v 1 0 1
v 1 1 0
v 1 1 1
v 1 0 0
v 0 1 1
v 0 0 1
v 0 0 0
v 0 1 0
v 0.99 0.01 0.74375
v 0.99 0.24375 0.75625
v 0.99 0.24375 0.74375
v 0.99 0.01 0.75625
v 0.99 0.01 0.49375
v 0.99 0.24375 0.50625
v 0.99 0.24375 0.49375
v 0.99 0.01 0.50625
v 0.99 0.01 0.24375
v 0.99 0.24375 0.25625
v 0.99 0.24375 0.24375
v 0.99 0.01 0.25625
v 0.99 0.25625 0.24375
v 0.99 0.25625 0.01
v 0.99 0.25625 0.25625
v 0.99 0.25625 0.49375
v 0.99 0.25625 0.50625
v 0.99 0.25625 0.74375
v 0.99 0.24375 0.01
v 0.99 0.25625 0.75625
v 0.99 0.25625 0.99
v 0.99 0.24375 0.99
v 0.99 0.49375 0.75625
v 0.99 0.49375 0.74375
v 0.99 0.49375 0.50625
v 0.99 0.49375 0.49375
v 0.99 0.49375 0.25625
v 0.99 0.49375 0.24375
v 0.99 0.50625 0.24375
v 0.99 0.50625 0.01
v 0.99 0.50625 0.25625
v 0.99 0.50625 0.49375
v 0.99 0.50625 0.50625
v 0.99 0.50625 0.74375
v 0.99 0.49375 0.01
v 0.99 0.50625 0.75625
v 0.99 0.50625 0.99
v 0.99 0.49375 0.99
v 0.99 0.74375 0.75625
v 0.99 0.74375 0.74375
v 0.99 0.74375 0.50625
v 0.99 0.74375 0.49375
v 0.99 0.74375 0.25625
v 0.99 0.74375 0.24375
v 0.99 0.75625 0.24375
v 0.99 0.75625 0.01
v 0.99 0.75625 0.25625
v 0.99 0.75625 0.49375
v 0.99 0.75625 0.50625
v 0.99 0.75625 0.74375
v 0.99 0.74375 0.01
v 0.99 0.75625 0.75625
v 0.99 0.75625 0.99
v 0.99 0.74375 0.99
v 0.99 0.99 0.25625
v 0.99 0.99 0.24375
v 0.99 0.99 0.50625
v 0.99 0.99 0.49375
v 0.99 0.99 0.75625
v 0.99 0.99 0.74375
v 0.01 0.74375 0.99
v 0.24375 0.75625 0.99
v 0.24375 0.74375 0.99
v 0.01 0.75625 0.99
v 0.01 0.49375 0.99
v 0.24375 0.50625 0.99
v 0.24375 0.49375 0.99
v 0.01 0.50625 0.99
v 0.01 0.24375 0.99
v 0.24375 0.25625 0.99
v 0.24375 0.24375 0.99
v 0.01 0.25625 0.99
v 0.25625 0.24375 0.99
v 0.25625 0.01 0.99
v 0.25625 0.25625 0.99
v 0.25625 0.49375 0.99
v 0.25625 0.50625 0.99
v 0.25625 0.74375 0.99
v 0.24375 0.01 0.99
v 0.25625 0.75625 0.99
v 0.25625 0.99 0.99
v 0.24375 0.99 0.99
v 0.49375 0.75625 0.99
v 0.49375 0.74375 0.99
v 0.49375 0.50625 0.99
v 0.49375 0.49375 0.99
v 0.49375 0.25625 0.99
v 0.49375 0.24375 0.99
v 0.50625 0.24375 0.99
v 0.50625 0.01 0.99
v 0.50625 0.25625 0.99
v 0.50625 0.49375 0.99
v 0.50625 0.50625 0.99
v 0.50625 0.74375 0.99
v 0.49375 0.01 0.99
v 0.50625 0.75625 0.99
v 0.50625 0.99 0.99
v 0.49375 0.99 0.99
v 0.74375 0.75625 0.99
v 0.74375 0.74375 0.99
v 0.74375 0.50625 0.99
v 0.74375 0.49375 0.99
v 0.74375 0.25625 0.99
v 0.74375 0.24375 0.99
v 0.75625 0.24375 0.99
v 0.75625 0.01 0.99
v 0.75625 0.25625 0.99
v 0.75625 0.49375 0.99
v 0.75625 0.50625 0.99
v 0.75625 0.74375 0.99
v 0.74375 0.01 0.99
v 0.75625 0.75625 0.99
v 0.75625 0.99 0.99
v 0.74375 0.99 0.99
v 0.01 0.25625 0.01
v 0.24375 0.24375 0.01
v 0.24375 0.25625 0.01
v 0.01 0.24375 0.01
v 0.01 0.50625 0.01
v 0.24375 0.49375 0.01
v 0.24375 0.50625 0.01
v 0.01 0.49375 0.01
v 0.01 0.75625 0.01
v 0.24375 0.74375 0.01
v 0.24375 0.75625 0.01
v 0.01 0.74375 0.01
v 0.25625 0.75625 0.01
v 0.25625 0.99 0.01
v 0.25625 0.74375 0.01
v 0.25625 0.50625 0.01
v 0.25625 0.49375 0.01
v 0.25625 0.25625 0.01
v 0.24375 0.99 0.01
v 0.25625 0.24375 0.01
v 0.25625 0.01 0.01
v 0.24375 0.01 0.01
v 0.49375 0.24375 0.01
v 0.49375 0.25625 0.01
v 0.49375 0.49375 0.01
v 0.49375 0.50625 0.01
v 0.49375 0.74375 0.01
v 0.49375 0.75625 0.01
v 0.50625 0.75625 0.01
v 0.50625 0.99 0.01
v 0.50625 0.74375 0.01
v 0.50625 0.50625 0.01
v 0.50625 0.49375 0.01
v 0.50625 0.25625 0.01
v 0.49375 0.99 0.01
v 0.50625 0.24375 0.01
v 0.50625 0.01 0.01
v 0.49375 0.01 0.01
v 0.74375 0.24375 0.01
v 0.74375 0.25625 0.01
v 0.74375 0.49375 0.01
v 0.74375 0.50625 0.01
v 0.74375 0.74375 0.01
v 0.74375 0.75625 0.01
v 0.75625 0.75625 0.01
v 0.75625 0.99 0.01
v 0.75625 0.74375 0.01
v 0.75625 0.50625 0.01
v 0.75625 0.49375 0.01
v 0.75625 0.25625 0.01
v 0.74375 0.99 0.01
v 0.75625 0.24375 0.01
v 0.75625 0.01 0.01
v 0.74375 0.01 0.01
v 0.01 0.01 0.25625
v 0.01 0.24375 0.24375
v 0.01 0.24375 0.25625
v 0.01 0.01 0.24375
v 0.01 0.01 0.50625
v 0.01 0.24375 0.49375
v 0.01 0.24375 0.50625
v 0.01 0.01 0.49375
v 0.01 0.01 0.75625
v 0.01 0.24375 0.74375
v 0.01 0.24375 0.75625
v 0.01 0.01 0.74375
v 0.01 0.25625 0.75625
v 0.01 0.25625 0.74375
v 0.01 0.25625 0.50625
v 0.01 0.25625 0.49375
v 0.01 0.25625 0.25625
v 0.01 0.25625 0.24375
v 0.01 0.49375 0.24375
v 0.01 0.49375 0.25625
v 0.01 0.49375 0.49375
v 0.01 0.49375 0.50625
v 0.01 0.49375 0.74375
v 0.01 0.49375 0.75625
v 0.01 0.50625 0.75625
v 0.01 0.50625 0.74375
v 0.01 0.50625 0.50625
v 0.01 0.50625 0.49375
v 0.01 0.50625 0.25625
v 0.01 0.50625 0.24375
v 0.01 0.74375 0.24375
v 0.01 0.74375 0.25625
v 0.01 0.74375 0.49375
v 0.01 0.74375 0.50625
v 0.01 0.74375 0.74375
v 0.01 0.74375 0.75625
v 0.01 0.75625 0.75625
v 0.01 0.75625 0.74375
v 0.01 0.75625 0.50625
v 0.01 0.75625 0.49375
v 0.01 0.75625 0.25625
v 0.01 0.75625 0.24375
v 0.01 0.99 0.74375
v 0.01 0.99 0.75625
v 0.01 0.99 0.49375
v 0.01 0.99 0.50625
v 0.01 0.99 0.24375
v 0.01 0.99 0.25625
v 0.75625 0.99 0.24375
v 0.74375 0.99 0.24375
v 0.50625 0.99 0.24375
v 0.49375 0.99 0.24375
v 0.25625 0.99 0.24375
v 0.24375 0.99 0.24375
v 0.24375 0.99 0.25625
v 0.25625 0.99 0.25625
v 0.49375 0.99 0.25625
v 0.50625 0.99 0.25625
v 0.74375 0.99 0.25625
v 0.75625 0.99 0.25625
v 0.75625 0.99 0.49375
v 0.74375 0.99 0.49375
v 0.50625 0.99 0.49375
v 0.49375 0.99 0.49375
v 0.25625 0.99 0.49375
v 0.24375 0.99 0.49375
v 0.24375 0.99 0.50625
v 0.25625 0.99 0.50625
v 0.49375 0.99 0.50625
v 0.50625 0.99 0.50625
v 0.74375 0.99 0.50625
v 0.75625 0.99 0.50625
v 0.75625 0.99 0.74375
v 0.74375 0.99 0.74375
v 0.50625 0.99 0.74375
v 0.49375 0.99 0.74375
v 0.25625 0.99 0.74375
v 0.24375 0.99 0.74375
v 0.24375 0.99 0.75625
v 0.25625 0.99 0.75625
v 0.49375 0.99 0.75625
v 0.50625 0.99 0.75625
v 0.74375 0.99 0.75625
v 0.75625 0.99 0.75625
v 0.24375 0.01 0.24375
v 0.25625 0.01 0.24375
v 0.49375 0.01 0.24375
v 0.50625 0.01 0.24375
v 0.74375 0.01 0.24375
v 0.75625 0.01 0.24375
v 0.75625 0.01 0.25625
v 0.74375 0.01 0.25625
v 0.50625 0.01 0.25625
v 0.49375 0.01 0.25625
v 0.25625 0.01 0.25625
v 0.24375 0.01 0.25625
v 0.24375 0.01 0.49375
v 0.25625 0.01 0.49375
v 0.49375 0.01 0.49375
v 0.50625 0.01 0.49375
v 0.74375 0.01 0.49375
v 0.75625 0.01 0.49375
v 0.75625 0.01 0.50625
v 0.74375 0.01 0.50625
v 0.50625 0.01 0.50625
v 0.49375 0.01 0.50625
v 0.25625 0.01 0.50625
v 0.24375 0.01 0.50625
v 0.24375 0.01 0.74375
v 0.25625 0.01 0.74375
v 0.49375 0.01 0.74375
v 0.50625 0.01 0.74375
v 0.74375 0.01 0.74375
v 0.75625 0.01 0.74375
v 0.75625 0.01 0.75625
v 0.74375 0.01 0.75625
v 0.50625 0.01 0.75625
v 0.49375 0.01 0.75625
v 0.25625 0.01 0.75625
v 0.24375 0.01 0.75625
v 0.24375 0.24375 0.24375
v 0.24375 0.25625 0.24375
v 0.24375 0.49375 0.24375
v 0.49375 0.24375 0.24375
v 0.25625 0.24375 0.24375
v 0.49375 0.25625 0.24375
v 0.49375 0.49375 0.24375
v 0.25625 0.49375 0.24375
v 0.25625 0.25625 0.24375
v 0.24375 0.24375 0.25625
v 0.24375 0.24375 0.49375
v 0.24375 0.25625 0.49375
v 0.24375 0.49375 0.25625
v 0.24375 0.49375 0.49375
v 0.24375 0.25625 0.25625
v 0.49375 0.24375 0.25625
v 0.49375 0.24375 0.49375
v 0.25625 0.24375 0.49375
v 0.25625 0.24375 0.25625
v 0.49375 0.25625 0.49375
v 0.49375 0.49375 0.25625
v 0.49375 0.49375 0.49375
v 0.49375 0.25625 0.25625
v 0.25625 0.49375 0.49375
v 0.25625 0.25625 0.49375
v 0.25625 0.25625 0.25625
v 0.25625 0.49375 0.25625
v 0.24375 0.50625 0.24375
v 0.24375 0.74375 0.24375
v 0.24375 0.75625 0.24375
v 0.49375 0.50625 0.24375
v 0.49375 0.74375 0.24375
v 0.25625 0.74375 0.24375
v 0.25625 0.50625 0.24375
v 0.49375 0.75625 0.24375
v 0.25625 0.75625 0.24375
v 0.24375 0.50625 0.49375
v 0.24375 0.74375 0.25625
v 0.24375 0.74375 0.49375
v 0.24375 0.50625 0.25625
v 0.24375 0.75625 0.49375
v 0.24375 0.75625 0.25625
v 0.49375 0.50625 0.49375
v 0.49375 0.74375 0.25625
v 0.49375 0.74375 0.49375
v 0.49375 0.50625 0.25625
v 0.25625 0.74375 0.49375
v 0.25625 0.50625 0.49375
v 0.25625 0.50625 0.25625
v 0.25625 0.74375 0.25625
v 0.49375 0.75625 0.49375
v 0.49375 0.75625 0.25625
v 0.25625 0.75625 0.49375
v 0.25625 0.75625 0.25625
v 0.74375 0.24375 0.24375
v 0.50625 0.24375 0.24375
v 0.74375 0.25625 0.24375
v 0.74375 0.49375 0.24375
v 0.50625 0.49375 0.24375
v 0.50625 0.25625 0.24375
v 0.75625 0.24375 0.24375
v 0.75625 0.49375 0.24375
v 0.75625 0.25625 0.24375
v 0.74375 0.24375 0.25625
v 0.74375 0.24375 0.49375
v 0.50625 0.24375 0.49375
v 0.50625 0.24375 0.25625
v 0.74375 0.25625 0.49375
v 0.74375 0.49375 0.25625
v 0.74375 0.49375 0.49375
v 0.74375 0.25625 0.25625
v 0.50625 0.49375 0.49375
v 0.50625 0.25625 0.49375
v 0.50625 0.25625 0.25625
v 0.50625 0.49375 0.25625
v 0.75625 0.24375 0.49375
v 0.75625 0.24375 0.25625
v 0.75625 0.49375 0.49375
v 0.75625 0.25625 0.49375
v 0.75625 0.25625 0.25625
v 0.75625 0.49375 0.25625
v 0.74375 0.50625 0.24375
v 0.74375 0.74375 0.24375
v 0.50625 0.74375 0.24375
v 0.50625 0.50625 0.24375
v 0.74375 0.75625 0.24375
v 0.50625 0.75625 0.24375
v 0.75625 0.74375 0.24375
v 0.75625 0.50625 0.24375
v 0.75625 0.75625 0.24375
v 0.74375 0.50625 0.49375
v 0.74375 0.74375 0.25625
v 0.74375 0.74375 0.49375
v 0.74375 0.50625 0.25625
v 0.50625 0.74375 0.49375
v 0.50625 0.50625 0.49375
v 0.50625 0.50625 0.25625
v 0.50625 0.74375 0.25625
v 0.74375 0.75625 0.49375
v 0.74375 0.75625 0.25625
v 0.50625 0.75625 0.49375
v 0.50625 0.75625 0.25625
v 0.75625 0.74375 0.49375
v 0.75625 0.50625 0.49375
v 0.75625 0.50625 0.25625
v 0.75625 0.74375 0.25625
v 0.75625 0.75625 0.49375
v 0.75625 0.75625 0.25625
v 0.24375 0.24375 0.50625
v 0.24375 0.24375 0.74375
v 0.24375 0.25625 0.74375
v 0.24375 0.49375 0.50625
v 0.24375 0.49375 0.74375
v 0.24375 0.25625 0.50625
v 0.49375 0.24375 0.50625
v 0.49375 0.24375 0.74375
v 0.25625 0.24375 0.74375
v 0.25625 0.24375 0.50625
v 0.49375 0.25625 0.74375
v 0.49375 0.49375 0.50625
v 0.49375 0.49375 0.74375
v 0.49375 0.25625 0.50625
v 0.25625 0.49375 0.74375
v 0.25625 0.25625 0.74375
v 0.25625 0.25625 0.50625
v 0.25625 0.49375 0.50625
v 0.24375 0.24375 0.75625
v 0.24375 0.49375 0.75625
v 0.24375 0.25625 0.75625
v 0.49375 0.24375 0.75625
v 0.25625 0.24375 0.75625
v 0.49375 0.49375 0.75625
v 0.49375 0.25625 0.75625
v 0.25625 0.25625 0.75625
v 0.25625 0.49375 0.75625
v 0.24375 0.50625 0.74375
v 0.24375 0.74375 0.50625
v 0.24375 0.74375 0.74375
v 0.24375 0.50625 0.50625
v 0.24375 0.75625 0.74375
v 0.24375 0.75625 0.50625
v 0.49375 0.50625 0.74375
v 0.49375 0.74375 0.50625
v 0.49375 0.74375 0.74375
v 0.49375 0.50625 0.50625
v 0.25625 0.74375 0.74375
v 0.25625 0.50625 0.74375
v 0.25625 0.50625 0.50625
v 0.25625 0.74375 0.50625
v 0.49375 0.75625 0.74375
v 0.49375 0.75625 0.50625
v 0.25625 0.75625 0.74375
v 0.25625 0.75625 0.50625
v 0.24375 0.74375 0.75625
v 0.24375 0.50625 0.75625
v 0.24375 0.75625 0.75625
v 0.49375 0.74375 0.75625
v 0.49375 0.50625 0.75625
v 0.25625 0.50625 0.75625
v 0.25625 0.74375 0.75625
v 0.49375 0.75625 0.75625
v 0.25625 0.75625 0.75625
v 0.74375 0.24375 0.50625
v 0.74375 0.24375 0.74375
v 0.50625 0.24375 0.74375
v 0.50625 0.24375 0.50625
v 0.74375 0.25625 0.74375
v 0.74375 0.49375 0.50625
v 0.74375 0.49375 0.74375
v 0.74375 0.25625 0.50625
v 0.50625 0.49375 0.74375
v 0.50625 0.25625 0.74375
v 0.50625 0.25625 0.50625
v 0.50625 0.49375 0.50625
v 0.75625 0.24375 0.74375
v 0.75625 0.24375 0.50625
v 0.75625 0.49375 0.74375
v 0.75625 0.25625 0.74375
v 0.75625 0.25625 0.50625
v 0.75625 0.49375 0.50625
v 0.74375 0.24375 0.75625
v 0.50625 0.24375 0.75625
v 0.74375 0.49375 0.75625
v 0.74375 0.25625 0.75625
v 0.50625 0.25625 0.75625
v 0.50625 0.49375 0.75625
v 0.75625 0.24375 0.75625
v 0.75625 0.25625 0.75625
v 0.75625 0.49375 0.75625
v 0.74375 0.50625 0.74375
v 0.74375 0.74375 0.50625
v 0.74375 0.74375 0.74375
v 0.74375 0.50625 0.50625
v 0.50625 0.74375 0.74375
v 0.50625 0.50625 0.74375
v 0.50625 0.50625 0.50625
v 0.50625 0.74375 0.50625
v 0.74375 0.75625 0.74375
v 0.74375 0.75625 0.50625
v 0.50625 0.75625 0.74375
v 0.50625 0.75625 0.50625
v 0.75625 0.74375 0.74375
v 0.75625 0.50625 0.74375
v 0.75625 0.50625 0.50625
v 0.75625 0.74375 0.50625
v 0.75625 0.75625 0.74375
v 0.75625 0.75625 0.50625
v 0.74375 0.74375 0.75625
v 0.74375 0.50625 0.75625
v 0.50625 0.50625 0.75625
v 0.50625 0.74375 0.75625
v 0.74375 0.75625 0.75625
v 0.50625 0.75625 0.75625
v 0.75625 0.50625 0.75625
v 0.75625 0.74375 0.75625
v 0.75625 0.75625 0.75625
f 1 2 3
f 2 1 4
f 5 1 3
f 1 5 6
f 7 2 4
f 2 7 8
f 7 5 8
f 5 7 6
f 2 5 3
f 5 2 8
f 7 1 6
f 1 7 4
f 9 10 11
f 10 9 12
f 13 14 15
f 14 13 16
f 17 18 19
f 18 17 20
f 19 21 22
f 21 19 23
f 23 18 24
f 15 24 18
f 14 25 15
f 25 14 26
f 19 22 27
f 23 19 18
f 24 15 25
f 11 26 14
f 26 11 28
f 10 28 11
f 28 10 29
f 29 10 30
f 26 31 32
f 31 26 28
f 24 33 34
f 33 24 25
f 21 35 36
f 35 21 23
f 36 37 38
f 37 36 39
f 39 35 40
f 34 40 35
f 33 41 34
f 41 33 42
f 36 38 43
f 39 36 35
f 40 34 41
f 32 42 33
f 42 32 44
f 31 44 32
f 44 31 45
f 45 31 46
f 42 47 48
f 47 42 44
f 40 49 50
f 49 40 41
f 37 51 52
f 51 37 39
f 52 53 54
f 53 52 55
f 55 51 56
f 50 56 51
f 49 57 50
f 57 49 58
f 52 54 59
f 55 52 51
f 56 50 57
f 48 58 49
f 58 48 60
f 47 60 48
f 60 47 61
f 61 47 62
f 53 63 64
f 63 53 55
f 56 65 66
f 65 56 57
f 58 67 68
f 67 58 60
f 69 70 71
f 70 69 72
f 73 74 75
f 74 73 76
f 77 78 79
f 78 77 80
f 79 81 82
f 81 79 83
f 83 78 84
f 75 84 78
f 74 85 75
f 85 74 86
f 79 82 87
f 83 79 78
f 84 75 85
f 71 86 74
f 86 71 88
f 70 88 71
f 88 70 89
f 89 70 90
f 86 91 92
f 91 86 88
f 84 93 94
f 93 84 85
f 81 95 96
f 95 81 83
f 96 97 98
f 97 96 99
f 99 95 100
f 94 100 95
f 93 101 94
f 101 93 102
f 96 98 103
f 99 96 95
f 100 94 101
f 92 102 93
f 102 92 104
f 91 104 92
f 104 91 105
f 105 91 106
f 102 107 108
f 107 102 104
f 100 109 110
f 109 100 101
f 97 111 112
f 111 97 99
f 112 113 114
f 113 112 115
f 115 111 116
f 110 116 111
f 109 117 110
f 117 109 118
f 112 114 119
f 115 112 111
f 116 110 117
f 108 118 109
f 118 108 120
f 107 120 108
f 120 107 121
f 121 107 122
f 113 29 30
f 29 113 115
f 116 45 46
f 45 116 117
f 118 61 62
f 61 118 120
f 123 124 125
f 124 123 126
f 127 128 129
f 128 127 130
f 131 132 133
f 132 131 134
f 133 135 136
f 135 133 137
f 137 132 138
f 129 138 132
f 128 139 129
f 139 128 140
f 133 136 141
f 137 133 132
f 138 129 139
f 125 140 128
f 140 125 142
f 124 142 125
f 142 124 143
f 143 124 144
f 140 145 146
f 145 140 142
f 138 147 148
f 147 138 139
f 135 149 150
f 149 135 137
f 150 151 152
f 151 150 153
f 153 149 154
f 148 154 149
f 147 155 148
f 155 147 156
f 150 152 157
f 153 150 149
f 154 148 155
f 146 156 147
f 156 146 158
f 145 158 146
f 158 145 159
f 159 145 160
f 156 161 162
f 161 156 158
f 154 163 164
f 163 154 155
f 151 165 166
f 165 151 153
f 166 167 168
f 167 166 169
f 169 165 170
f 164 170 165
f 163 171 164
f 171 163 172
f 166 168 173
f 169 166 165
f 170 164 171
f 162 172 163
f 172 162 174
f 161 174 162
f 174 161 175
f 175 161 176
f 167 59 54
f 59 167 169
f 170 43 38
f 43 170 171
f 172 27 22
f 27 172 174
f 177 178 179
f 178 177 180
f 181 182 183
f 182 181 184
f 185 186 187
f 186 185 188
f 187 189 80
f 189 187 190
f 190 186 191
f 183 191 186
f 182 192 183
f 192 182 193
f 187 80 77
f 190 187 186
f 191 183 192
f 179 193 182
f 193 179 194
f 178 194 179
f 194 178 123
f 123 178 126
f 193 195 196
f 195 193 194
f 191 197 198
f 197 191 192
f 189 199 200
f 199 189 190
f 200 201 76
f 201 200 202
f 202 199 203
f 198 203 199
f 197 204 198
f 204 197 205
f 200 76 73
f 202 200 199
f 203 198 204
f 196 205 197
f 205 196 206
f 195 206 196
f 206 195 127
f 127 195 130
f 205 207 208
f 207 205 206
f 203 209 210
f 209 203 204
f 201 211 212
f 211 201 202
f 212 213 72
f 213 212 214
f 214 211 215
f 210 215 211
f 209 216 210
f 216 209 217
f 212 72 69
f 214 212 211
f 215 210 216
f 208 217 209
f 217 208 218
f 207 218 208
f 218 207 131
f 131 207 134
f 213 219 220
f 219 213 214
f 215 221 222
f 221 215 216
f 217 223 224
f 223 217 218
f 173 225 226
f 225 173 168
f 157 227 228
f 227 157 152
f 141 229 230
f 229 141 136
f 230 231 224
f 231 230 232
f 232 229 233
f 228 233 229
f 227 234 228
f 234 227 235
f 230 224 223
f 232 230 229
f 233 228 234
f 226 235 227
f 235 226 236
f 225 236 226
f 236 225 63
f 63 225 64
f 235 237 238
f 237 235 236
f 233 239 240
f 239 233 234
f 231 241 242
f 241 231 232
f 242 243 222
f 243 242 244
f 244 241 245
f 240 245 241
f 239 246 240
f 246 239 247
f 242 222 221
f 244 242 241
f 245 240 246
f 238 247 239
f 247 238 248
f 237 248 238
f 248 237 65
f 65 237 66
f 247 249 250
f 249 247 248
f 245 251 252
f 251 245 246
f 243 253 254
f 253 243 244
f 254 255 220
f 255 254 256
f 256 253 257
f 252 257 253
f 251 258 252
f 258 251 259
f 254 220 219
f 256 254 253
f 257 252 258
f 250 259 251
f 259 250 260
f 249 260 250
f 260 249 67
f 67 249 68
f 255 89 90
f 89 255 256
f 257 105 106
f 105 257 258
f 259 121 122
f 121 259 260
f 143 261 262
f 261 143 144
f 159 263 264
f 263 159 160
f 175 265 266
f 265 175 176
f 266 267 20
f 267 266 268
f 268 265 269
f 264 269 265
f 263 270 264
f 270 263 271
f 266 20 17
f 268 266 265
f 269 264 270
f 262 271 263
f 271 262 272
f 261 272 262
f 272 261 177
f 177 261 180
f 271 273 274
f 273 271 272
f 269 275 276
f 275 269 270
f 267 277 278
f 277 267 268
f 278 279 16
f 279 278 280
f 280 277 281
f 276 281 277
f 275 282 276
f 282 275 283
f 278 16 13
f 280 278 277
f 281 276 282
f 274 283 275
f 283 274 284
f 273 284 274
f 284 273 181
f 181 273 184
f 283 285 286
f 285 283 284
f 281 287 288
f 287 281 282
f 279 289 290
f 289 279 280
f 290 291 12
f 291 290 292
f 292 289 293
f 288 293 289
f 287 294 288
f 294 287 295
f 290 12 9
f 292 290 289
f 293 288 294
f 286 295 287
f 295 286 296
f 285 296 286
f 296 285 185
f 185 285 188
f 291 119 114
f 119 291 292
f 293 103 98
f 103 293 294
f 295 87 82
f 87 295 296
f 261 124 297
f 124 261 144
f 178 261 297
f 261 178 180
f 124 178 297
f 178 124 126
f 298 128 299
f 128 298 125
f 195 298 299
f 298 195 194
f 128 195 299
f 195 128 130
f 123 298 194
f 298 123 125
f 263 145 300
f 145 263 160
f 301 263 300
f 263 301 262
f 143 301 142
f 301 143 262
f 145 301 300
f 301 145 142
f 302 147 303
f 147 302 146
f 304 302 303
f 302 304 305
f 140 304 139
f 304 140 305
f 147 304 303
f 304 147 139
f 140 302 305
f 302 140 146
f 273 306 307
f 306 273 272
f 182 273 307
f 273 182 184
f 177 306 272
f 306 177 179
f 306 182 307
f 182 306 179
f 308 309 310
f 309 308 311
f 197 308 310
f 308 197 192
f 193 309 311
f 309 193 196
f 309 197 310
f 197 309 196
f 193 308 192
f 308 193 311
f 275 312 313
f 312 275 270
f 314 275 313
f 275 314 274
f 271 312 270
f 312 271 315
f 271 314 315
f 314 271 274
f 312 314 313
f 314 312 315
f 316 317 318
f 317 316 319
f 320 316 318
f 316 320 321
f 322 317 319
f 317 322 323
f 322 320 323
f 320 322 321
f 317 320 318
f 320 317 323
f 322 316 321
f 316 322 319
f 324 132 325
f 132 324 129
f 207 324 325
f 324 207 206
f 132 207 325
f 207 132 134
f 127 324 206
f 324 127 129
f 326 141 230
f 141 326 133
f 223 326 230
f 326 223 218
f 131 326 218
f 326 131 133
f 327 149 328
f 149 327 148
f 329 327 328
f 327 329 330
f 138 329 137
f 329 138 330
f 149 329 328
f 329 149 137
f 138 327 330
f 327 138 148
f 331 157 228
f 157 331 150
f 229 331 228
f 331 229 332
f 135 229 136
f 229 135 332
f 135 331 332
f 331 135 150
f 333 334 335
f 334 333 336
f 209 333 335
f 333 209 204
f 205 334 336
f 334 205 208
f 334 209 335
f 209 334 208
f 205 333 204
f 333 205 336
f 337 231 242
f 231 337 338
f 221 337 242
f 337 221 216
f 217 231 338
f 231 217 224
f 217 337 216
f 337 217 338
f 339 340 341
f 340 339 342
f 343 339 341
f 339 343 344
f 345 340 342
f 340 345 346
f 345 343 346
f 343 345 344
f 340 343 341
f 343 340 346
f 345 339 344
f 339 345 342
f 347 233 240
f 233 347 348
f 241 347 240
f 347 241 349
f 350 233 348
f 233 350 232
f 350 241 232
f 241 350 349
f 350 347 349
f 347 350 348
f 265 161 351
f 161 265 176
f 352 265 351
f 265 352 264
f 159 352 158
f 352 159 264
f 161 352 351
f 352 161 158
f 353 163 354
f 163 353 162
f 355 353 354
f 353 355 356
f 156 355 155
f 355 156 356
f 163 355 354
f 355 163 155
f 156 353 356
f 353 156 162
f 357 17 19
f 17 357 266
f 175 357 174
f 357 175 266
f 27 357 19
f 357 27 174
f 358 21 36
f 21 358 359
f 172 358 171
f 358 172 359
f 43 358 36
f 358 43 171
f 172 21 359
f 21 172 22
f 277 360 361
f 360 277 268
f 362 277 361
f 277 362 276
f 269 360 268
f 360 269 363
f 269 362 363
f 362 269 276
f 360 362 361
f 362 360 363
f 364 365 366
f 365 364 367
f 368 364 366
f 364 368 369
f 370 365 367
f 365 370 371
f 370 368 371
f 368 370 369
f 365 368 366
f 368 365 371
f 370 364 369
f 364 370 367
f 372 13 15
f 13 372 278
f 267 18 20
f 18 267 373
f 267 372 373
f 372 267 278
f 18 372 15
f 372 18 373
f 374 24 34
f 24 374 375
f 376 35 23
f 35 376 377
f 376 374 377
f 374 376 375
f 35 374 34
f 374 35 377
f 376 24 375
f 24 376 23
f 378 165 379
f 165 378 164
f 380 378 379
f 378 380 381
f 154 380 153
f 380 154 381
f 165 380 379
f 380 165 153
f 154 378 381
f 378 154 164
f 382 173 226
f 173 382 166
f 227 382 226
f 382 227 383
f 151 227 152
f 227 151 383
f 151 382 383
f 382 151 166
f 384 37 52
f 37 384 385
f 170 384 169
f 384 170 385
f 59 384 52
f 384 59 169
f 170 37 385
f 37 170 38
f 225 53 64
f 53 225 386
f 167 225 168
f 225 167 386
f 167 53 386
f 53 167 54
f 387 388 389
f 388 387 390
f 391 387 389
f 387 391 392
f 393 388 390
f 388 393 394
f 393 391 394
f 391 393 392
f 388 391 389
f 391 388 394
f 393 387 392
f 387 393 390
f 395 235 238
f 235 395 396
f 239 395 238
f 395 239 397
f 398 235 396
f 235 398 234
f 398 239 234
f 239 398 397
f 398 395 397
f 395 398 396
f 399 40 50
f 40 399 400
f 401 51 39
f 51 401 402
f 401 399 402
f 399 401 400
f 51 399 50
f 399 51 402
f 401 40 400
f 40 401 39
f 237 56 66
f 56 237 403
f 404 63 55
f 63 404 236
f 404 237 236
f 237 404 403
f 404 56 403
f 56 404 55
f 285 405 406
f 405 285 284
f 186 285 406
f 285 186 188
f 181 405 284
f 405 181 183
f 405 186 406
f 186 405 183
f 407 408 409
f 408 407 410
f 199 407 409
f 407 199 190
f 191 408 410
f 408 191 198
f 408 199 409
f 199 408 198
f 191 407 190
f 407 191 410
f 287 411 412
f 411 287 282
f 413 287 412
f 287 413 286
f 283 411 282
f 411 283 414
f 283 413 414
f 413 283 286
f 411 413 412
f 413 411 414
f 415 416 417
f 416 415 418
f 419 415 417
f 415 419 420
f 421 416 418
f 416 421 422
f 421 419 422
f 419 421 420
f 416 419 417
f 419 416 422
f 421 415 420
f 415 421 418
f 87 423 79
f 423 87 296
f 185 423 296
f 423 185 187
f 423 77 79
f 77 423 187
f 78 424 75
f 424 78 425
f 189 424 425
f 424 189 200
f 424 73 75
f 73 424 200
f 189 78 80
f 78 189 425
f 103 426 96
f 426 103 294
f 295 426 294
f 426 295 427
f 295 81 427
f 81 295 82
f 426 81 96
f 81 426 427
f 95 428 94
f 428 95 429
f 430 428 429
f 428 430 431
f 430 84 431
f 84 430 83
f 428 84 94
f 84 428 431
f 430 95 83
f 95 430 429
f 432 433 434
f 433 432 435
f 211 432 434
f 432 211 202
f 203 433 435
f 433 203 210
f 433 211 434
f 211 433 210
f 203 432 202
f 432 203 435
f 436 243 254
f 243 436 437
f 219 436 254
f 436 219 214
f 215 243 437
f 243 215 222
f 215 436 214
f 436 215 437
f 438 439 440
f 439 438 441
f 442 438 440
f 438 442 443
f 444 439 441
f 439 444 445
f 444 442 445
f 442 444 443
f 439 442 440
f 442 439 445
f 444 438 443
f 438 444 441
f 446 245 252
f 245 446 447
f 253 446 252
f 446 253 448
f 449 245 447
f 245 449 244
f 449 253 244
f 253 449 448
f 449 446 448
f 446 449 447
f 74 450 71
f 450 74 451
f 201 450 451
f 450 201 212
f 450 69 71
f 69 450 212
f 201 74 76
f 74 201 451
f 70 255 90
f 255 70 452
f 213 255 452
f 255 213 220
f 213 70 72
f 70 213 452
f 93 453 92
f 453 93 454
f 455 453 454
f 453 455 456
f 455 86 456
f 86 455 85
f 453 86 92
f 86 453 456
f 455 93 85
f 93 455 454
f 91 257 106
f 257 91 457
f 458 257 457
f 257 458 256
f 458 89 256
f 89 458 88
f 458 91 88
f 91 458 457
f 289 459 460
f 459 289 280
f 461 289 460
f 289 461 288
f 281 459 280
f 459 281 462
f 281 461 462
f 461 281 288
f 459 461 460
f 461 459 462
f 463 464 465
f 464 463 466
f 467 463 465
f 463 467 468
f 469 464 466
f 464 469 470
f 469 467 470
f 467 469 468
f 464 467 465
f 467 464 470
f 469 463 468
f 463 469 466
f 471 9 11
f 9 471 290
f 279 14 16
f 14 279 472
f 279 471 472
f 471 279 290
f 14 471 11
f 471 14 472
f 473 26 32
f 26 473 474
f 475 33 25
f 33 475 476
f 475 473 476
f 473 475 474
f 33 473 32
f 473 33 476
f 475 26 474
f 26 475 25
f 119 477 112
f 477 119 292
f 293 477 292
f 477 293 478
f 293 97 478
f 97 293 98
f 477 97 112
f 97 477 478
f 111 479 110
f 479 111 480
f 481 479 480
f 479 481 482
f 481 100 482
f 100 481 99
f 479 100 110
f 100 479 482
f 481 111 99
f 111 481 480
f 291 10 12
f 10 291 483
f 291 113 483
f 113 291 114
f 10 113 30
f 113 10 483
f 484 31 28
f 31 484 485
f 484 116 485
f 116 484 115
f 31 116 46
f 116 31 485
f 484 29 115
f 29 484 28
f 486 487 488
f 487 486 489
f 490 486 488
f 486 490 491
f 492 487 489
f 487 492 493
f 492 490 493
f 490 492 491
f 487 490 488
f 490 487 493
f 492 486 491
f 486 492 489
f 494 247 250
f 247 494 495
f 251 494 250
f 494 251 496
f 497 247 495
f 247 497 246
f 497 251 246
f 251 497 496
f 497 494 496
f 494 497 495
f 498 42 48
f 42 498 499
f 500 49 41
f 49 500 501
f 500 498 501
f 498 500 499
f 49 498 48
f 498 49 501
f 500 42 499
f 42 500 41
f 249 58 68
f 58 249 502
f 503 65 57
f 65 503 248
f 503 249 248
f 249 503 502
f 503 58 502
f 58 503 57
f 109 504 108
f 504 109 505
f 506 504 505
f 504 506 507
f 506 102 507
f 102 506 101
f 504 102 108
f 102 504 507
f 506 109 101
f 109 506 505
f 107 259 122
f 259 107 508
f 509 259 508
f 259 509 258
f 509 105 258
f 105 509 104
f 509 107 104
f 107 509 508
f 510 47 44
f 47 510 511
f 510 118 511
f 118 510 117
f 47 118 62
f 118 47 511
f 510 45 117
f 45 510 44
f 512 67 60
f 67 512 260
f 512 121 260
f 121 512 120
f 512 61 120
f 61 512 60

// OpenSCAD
translate([0.125, 0.125, 0.125]) color([0.7995005100691247, 0.34047238184459006, 0.1286635278612125]) cube([0.2375, 0.2375, 0.2375], center=true);
translate([0.125, 0.375, 0.125]) color([0.6020598448119898, 0.9167847797194366, 0.02081986636819022]) cube([0.2375, 0.2375, 0.2375], center=true);
translate([0.375, 0.125, 0.125]) color([0.9135118305629362, 0.3823609034395232, 0.42581309278619206]) cube([0.2375, 0.2375, 0.2375], center=true);
translate([0.375, 0.375, 0.125]) color([0.08967296065919184, 0.0016857337534631478, 0.31287848776698257]) cube([0.2375, 0.2375, 0.2375], center=true);
translate([0.125, 0.125, 0.375]) color([0.09731792302828757, 0.364404074066101, 0.8754307508322564]) cube([0.2375, 0.2375, 0.2375], center=true);
translate([0.125, 0.375, 0.375]) color([0.6967090939923642, 0.5776053806129825, 0.18685318159950626]) cube([0.2375, 0.2375, 0.2375], center=true);
translate([0.375, 0.125, 0.375]) color([0.9585806736472646, 0.593334846568766, 0.09927504601217696]) cube([0.2375, 0.2375, 0.2375], center=true);
translate([0.375, 0.375, 0.375]) color([0.19313665173925, 0.6863688301261038, 0.2093263356404984]) cube([0.2375, 0.2375, 0.2375], center=true);
translate([0.125, 0.625, 0.125]) color([0.2694340379225941, 0.24598969558588324, 0.16092298384524362]) cube([0.2375, 0.2375, 0.2375], center=true);
translate([0.125, 0.875, 0.125]) color([0.5102606956149307, 0.431705445139412, 0.38909399282504675]) cube([0.2375, 0.2375, 0.2375], center=true);
translate([0.375, 0.625, 0.125]) color([0.3194819673674283, 0.6655357355223767, 0.22692357675811492]) cube([0.2375, 0.2375, 0.2375], center=true);
translate([0.375, 0.875, 0.125]) color([0.9464906820257937, 0.35776616524050997, 0.9421064453260054]) cube([0.2375, 0.2375, 0.2375], center=true);
translate([0.125, 0.625, 0.375]) color([0.3792404853118415, 0.27508202782836655, 0.9368074710650367]) cube([0.2375, 0.2375, 0.2375], center=true);
translate([0.125, 0.875, 0.375]) color([0.7670397757471089, 0.17483880300164423, 0.7474114244696689]) cube([0.2375, 0.2375, 0.2375], center=true);
translate([0.375, 0.625, 0.375]) color([0.6015236368594579, 0.5872808850844162, 0.28390336255679416]) cube([0.2375, 0.2375, 0.2375], center=true);
translate([0.375, 0.875, 0.375]) color([0.5839405385485582, 0.4048698908705002, 0.6877557316706271]) cube([0.2375, 0.2375, 0.2375], center=true);
translate([0.625, 0.125, 0.125]) color([0.29310936231965135, 0.08456113000314536, 0.6409271470126323]) cube([0.2375, 0.2375, 0.2375], center=true);
translate([0.625, 0.375, 0.125]) color([0.38512246522478266, 0.6162859510128613, 0.407224705538046]) cube([0.2375, 0.2375, 0.2375], center=true);
translate([0.875, 0.125, 0.125]) color([0.6107800780239486, 0.9541913078580654, 0.09369719926319908]) cube([0.2375, 0.2375, 0.2375], center=true);
translate([0.875, 0.375, 0.125]) color([0.4396226851829427, 0.9817497074141792, 0.30111933510979894]) cube([0.2375, 0.2375, 0.2375], center=true);
translate([0.625, 0.125, 0.375]) color([0.08571041628526821, 0.691130580335744, 0.16573157374072334]) cube([0.2375, 0.2375, 0.2375], center=true);
translate([0.625, 0.375, 0.375]) color([0.4668304924867862, 0.30100213617539295, 0.3511677492745029]) cube([0.2375, 0.2375, 0.2375], center=true);
translate([0.875, 0.125, 0.375]) color([0.05564944269037686, 0.7696481469448815, 0.686275624239137]) cube([0.2375, 0.2375, 0.2375], center=true);
translate([0.875, 0.375, 0.375]) color([0.15447252119296884, 0.35335085758162643, 0.18799175914388588]) cube([0.2375, 0.2375, 0.2375], center=true);
translate([0.625, 0.625, 0.125]) color([0.41322879780265653, 0.82270842281296, 0.9057146612667819]) cube([0.2375, 0.2375, 0.2375], center=true);
translate([0.625, 0.875, 0.125]) color([0.9688547633127277, 0.5528378273263655, 0.12760284187612392]) cube([0.2375, 0.2375, 0.2375], center=true);
translate([0.875, 0.625, 0.125]) color([0.1710979555253146, 0.7131998843266452, 0.6397779425125977]) cube([0.2375, 0.2375, 0.2375], center=true);
translate([0.875, 0.875, 0.125]) color([0.57496968906483, 0.8489371230716904, 0.07944838941339594]) cube([0.2375, 0.2375, 0.2375], center=true);
translate([0.625, 0.625, 0.375]) color([0.040333123224873146, 0.9305910632054132, 0.3080440975445232]) cube([0.2375, 0.2375, 0.2375], center=true);
translate([0.625, 0.875, 0.375]) color([0.6084655882345898, 0.4923441190446234, 0.7069385087242315]) cube([0.2375, 0.2375, 0.2375], center=true);
translate([0.875, 0.625, 0.375]) color([0.6803385961846494, 0.18024793645131376, 0.10787678186317007]) cube([0.2375, 0.2375, 0.2375], center=true);
translate([0.875, 0.875, 0.375]) color([0.1335624130282893, 0.47731112778056706, 0.8393950916733898]) cube([0.2375, 0.2375, 0.2375], center=true);
translate([0.125, 0.125, 0.625]) color([0.6780893207968227, 0.08337096158279222, 0.27725115680544954]) cube([0.2375, 0.2375, 0.2375], center=true);
translate([0.125, 0.375, 0.625]) color([0.9965791662073833, 0.03375154870506614, 0.10494976972159242]) cube([0.2375, 0.2375, 0.2375], center=true);
translate([0.375, 0.125, 0.625]) color([0.516844917539197, 0.1360610465034362, 0.543805910213663]) cube([0.2375, 0.2375, 0.2375], center=true);
translate([0.375, 0.375, 0.625]) color([0.04901628196141694, 0.4867102513994055, 0.8813892002857401]) cube([0.2375, 0.2375, 0.2375], center=true);
translate([0.125, 0.125, 0.875]) color([0.3053751014353143, 0.40772022041766365, 0.31297204198076634]) cube([0.2375, 0.2375, 0.2375], center=true);
translate([0.125, 0.375, 0.875]) color([0.49907796034366436, 0.6160709555012981, 0.9916538905911245]) cube([0.2375, 0.2375, 0.2375], center=true);
translate([0.375, 0.125, 0.875]) color([0.3123575451593331, 0.46364206475662195, 0.8862899719975306]) cube([0.2375, 0.2375, 0.2375], center=true);
translate([0.375, 0.375, 0.875]) color([0.5738800220993816, 0.8494037217359881, 0.24323676398212035]) cube([0.2375, 0.2375, 0.2375], center=true);
translate([0.125, 0.625, 0.625]) color([0.8402878098664139, 0.9530478541805099, 0.16594803365564914]) cube([0.2375, 0.2375, 0.2375], center=true);
translate([0.125, 0.875, 0.625]) color([0.0023370868964924796, 0.7387895340607371, 0.5374530602666081]) cube([0.2375, 0.2375, 0.2375], center=true);
translate([0.375, 0.625, 0.625]) color([0.25604025835089217, 0.4320068924153808, 0.5112453323210508]) cube([0.2375, 0.2375, 0.2375], center=true);
translate([0.375, 0.875, 0.625]) color([0.7462272619347637, 0.5039790716190428, 0.8850839351693509]) cube([0.2375, 0.2375, 0.2375], center=true);
translate([0.125, 0.625, 0.875]) color([0.6652757233710683, 0.22263754843686523, 0.08942086350367451]) cube([0.2375, 0.2375, 0.2375], center=true);
translate([0.125, 0.875, 0.875]) color([0.6195232841458308, 0.9036720387350747, 0.7222923954673625]) cube([0.2375, 0.2375, 0.2375], center=true);
translate([0.375, 0.625, 0.875]) color([0.6665075097113882, 0.5421139713900744, 0.6943978877819516]) cube([0.2375, 0.2375, 0.2375], center=true);
translate([0.375, 0.875, 0.875]) color([0.9269770591996176, 0.12480324665016229, 0.8422397758241813]) cube([0.2375, 0.2375, 0.2375], center=true);
translate([0.625, 0.125, 0.625]) color([0.028249143050612435, 0.8554899328562455, 0.6212809598996976]) cube([0.2375, 0.2375, 0.2375], center=true);
translate([0.625, 0.375, 0.625]) color([0.6435486749275994, 0.4857227915978113, 0.2898251547629681]) cube([0.2375, 0.2375, 0.2375], center=true);
translate([0.875, 0.125, 0.625]) color([0.21709076393122206, 0.4979948584580751, 0.6176241526046676]) cube([0.2375, 0.2375, 0.2375], center=true);
translate([0.875, 0.375, 0.625]) color([0.4722249532281336, 0.7228331534363125, 0.6109414561657331]) cube([0.2375, 0.2375, 0.2375], center=true);
translate([0.625, 0.125, 0.875]) color([0.5330085163671737, 0.6769359871291822, 0.5973748769978083]) cube([0.2375, 0.2375, 0.2375], center=true);
translate([0.625, 0.375, 0.875]) color([0.14460255854654236, 0.21273280877313017, 0.8417179364881341]) cube([0.2375, 0.2375, 0.2375], center=true);
translate([0.875, 0.125, 0.875]) color([0.6300391880279899, 0.5103677782275869, 0.4479627161837708]) cube([0.2375, 0.2375, 0.2375], center=true);
translate([0.875, 0.375, 0.875]) color([0.2903518628620462, 0.1744676713524972, 0.5457372127765215]) cube([0.2375, 0.2375, 0.2375], center=true);
translate([0.625, 0.625, 0.625]) color([0.6340658375422632, 0.7004271366493812, 0.690956934786038]) cube([0.2375, 0.2375, 0.2375], center=true);
translate([0.625, 0.875, 0.625]) color([0.013948469234104865, 0.8018456354370093, 0.2607079205191076]) cube([0.2375, 0.2375, 0.2375], center=true);
translate([0.875, 0.625, 0.625]) color([0.01899716010339858, 0.7507132946374245, 0.44168653561511173]) cube([0.2375, 0.2375, 0.2375], center=true);
translate([0.875, 0.875, 0.625]) color([0.1668653701245908, 0.45955837321901094, 0.7876756969907556]) cube([0.2375, 0.2375, 0.2375], center=true);
translate([0.625, 0.625, 0.875]) color([0.09564527702692727, 0.06733136152719421, 0.7816649665975636]) cube([0.2375, 0.2375, 0.2375], center=true);
translate([0.625, 0.875, 0.875]) color([0.030385075649315252, 0.33346286891595733, 0.08647112242809318]) cube([0.2375, 0.2375, 0.2375], center=true);
translate([0.875, 0.625, 0.875]) color([0.8161439782233904, 0.05657658467482607, 0.8243668117903717]) cube([0.2375, 0.2375, 0.2375], center=true);
translate([0.875, 0.875, 0.875]) color([0.05808931884644186, 0.6181904095369413, 0.1426995958976538]) cube([0.2375, 0.2375, 0.2375], center=true);
color([0.3,0.3,0.3,0.3]) difference() { cube([1,1,1]); translate([0.01,0.01,0.01]) cube([0.98,0.98,0.98]); }
